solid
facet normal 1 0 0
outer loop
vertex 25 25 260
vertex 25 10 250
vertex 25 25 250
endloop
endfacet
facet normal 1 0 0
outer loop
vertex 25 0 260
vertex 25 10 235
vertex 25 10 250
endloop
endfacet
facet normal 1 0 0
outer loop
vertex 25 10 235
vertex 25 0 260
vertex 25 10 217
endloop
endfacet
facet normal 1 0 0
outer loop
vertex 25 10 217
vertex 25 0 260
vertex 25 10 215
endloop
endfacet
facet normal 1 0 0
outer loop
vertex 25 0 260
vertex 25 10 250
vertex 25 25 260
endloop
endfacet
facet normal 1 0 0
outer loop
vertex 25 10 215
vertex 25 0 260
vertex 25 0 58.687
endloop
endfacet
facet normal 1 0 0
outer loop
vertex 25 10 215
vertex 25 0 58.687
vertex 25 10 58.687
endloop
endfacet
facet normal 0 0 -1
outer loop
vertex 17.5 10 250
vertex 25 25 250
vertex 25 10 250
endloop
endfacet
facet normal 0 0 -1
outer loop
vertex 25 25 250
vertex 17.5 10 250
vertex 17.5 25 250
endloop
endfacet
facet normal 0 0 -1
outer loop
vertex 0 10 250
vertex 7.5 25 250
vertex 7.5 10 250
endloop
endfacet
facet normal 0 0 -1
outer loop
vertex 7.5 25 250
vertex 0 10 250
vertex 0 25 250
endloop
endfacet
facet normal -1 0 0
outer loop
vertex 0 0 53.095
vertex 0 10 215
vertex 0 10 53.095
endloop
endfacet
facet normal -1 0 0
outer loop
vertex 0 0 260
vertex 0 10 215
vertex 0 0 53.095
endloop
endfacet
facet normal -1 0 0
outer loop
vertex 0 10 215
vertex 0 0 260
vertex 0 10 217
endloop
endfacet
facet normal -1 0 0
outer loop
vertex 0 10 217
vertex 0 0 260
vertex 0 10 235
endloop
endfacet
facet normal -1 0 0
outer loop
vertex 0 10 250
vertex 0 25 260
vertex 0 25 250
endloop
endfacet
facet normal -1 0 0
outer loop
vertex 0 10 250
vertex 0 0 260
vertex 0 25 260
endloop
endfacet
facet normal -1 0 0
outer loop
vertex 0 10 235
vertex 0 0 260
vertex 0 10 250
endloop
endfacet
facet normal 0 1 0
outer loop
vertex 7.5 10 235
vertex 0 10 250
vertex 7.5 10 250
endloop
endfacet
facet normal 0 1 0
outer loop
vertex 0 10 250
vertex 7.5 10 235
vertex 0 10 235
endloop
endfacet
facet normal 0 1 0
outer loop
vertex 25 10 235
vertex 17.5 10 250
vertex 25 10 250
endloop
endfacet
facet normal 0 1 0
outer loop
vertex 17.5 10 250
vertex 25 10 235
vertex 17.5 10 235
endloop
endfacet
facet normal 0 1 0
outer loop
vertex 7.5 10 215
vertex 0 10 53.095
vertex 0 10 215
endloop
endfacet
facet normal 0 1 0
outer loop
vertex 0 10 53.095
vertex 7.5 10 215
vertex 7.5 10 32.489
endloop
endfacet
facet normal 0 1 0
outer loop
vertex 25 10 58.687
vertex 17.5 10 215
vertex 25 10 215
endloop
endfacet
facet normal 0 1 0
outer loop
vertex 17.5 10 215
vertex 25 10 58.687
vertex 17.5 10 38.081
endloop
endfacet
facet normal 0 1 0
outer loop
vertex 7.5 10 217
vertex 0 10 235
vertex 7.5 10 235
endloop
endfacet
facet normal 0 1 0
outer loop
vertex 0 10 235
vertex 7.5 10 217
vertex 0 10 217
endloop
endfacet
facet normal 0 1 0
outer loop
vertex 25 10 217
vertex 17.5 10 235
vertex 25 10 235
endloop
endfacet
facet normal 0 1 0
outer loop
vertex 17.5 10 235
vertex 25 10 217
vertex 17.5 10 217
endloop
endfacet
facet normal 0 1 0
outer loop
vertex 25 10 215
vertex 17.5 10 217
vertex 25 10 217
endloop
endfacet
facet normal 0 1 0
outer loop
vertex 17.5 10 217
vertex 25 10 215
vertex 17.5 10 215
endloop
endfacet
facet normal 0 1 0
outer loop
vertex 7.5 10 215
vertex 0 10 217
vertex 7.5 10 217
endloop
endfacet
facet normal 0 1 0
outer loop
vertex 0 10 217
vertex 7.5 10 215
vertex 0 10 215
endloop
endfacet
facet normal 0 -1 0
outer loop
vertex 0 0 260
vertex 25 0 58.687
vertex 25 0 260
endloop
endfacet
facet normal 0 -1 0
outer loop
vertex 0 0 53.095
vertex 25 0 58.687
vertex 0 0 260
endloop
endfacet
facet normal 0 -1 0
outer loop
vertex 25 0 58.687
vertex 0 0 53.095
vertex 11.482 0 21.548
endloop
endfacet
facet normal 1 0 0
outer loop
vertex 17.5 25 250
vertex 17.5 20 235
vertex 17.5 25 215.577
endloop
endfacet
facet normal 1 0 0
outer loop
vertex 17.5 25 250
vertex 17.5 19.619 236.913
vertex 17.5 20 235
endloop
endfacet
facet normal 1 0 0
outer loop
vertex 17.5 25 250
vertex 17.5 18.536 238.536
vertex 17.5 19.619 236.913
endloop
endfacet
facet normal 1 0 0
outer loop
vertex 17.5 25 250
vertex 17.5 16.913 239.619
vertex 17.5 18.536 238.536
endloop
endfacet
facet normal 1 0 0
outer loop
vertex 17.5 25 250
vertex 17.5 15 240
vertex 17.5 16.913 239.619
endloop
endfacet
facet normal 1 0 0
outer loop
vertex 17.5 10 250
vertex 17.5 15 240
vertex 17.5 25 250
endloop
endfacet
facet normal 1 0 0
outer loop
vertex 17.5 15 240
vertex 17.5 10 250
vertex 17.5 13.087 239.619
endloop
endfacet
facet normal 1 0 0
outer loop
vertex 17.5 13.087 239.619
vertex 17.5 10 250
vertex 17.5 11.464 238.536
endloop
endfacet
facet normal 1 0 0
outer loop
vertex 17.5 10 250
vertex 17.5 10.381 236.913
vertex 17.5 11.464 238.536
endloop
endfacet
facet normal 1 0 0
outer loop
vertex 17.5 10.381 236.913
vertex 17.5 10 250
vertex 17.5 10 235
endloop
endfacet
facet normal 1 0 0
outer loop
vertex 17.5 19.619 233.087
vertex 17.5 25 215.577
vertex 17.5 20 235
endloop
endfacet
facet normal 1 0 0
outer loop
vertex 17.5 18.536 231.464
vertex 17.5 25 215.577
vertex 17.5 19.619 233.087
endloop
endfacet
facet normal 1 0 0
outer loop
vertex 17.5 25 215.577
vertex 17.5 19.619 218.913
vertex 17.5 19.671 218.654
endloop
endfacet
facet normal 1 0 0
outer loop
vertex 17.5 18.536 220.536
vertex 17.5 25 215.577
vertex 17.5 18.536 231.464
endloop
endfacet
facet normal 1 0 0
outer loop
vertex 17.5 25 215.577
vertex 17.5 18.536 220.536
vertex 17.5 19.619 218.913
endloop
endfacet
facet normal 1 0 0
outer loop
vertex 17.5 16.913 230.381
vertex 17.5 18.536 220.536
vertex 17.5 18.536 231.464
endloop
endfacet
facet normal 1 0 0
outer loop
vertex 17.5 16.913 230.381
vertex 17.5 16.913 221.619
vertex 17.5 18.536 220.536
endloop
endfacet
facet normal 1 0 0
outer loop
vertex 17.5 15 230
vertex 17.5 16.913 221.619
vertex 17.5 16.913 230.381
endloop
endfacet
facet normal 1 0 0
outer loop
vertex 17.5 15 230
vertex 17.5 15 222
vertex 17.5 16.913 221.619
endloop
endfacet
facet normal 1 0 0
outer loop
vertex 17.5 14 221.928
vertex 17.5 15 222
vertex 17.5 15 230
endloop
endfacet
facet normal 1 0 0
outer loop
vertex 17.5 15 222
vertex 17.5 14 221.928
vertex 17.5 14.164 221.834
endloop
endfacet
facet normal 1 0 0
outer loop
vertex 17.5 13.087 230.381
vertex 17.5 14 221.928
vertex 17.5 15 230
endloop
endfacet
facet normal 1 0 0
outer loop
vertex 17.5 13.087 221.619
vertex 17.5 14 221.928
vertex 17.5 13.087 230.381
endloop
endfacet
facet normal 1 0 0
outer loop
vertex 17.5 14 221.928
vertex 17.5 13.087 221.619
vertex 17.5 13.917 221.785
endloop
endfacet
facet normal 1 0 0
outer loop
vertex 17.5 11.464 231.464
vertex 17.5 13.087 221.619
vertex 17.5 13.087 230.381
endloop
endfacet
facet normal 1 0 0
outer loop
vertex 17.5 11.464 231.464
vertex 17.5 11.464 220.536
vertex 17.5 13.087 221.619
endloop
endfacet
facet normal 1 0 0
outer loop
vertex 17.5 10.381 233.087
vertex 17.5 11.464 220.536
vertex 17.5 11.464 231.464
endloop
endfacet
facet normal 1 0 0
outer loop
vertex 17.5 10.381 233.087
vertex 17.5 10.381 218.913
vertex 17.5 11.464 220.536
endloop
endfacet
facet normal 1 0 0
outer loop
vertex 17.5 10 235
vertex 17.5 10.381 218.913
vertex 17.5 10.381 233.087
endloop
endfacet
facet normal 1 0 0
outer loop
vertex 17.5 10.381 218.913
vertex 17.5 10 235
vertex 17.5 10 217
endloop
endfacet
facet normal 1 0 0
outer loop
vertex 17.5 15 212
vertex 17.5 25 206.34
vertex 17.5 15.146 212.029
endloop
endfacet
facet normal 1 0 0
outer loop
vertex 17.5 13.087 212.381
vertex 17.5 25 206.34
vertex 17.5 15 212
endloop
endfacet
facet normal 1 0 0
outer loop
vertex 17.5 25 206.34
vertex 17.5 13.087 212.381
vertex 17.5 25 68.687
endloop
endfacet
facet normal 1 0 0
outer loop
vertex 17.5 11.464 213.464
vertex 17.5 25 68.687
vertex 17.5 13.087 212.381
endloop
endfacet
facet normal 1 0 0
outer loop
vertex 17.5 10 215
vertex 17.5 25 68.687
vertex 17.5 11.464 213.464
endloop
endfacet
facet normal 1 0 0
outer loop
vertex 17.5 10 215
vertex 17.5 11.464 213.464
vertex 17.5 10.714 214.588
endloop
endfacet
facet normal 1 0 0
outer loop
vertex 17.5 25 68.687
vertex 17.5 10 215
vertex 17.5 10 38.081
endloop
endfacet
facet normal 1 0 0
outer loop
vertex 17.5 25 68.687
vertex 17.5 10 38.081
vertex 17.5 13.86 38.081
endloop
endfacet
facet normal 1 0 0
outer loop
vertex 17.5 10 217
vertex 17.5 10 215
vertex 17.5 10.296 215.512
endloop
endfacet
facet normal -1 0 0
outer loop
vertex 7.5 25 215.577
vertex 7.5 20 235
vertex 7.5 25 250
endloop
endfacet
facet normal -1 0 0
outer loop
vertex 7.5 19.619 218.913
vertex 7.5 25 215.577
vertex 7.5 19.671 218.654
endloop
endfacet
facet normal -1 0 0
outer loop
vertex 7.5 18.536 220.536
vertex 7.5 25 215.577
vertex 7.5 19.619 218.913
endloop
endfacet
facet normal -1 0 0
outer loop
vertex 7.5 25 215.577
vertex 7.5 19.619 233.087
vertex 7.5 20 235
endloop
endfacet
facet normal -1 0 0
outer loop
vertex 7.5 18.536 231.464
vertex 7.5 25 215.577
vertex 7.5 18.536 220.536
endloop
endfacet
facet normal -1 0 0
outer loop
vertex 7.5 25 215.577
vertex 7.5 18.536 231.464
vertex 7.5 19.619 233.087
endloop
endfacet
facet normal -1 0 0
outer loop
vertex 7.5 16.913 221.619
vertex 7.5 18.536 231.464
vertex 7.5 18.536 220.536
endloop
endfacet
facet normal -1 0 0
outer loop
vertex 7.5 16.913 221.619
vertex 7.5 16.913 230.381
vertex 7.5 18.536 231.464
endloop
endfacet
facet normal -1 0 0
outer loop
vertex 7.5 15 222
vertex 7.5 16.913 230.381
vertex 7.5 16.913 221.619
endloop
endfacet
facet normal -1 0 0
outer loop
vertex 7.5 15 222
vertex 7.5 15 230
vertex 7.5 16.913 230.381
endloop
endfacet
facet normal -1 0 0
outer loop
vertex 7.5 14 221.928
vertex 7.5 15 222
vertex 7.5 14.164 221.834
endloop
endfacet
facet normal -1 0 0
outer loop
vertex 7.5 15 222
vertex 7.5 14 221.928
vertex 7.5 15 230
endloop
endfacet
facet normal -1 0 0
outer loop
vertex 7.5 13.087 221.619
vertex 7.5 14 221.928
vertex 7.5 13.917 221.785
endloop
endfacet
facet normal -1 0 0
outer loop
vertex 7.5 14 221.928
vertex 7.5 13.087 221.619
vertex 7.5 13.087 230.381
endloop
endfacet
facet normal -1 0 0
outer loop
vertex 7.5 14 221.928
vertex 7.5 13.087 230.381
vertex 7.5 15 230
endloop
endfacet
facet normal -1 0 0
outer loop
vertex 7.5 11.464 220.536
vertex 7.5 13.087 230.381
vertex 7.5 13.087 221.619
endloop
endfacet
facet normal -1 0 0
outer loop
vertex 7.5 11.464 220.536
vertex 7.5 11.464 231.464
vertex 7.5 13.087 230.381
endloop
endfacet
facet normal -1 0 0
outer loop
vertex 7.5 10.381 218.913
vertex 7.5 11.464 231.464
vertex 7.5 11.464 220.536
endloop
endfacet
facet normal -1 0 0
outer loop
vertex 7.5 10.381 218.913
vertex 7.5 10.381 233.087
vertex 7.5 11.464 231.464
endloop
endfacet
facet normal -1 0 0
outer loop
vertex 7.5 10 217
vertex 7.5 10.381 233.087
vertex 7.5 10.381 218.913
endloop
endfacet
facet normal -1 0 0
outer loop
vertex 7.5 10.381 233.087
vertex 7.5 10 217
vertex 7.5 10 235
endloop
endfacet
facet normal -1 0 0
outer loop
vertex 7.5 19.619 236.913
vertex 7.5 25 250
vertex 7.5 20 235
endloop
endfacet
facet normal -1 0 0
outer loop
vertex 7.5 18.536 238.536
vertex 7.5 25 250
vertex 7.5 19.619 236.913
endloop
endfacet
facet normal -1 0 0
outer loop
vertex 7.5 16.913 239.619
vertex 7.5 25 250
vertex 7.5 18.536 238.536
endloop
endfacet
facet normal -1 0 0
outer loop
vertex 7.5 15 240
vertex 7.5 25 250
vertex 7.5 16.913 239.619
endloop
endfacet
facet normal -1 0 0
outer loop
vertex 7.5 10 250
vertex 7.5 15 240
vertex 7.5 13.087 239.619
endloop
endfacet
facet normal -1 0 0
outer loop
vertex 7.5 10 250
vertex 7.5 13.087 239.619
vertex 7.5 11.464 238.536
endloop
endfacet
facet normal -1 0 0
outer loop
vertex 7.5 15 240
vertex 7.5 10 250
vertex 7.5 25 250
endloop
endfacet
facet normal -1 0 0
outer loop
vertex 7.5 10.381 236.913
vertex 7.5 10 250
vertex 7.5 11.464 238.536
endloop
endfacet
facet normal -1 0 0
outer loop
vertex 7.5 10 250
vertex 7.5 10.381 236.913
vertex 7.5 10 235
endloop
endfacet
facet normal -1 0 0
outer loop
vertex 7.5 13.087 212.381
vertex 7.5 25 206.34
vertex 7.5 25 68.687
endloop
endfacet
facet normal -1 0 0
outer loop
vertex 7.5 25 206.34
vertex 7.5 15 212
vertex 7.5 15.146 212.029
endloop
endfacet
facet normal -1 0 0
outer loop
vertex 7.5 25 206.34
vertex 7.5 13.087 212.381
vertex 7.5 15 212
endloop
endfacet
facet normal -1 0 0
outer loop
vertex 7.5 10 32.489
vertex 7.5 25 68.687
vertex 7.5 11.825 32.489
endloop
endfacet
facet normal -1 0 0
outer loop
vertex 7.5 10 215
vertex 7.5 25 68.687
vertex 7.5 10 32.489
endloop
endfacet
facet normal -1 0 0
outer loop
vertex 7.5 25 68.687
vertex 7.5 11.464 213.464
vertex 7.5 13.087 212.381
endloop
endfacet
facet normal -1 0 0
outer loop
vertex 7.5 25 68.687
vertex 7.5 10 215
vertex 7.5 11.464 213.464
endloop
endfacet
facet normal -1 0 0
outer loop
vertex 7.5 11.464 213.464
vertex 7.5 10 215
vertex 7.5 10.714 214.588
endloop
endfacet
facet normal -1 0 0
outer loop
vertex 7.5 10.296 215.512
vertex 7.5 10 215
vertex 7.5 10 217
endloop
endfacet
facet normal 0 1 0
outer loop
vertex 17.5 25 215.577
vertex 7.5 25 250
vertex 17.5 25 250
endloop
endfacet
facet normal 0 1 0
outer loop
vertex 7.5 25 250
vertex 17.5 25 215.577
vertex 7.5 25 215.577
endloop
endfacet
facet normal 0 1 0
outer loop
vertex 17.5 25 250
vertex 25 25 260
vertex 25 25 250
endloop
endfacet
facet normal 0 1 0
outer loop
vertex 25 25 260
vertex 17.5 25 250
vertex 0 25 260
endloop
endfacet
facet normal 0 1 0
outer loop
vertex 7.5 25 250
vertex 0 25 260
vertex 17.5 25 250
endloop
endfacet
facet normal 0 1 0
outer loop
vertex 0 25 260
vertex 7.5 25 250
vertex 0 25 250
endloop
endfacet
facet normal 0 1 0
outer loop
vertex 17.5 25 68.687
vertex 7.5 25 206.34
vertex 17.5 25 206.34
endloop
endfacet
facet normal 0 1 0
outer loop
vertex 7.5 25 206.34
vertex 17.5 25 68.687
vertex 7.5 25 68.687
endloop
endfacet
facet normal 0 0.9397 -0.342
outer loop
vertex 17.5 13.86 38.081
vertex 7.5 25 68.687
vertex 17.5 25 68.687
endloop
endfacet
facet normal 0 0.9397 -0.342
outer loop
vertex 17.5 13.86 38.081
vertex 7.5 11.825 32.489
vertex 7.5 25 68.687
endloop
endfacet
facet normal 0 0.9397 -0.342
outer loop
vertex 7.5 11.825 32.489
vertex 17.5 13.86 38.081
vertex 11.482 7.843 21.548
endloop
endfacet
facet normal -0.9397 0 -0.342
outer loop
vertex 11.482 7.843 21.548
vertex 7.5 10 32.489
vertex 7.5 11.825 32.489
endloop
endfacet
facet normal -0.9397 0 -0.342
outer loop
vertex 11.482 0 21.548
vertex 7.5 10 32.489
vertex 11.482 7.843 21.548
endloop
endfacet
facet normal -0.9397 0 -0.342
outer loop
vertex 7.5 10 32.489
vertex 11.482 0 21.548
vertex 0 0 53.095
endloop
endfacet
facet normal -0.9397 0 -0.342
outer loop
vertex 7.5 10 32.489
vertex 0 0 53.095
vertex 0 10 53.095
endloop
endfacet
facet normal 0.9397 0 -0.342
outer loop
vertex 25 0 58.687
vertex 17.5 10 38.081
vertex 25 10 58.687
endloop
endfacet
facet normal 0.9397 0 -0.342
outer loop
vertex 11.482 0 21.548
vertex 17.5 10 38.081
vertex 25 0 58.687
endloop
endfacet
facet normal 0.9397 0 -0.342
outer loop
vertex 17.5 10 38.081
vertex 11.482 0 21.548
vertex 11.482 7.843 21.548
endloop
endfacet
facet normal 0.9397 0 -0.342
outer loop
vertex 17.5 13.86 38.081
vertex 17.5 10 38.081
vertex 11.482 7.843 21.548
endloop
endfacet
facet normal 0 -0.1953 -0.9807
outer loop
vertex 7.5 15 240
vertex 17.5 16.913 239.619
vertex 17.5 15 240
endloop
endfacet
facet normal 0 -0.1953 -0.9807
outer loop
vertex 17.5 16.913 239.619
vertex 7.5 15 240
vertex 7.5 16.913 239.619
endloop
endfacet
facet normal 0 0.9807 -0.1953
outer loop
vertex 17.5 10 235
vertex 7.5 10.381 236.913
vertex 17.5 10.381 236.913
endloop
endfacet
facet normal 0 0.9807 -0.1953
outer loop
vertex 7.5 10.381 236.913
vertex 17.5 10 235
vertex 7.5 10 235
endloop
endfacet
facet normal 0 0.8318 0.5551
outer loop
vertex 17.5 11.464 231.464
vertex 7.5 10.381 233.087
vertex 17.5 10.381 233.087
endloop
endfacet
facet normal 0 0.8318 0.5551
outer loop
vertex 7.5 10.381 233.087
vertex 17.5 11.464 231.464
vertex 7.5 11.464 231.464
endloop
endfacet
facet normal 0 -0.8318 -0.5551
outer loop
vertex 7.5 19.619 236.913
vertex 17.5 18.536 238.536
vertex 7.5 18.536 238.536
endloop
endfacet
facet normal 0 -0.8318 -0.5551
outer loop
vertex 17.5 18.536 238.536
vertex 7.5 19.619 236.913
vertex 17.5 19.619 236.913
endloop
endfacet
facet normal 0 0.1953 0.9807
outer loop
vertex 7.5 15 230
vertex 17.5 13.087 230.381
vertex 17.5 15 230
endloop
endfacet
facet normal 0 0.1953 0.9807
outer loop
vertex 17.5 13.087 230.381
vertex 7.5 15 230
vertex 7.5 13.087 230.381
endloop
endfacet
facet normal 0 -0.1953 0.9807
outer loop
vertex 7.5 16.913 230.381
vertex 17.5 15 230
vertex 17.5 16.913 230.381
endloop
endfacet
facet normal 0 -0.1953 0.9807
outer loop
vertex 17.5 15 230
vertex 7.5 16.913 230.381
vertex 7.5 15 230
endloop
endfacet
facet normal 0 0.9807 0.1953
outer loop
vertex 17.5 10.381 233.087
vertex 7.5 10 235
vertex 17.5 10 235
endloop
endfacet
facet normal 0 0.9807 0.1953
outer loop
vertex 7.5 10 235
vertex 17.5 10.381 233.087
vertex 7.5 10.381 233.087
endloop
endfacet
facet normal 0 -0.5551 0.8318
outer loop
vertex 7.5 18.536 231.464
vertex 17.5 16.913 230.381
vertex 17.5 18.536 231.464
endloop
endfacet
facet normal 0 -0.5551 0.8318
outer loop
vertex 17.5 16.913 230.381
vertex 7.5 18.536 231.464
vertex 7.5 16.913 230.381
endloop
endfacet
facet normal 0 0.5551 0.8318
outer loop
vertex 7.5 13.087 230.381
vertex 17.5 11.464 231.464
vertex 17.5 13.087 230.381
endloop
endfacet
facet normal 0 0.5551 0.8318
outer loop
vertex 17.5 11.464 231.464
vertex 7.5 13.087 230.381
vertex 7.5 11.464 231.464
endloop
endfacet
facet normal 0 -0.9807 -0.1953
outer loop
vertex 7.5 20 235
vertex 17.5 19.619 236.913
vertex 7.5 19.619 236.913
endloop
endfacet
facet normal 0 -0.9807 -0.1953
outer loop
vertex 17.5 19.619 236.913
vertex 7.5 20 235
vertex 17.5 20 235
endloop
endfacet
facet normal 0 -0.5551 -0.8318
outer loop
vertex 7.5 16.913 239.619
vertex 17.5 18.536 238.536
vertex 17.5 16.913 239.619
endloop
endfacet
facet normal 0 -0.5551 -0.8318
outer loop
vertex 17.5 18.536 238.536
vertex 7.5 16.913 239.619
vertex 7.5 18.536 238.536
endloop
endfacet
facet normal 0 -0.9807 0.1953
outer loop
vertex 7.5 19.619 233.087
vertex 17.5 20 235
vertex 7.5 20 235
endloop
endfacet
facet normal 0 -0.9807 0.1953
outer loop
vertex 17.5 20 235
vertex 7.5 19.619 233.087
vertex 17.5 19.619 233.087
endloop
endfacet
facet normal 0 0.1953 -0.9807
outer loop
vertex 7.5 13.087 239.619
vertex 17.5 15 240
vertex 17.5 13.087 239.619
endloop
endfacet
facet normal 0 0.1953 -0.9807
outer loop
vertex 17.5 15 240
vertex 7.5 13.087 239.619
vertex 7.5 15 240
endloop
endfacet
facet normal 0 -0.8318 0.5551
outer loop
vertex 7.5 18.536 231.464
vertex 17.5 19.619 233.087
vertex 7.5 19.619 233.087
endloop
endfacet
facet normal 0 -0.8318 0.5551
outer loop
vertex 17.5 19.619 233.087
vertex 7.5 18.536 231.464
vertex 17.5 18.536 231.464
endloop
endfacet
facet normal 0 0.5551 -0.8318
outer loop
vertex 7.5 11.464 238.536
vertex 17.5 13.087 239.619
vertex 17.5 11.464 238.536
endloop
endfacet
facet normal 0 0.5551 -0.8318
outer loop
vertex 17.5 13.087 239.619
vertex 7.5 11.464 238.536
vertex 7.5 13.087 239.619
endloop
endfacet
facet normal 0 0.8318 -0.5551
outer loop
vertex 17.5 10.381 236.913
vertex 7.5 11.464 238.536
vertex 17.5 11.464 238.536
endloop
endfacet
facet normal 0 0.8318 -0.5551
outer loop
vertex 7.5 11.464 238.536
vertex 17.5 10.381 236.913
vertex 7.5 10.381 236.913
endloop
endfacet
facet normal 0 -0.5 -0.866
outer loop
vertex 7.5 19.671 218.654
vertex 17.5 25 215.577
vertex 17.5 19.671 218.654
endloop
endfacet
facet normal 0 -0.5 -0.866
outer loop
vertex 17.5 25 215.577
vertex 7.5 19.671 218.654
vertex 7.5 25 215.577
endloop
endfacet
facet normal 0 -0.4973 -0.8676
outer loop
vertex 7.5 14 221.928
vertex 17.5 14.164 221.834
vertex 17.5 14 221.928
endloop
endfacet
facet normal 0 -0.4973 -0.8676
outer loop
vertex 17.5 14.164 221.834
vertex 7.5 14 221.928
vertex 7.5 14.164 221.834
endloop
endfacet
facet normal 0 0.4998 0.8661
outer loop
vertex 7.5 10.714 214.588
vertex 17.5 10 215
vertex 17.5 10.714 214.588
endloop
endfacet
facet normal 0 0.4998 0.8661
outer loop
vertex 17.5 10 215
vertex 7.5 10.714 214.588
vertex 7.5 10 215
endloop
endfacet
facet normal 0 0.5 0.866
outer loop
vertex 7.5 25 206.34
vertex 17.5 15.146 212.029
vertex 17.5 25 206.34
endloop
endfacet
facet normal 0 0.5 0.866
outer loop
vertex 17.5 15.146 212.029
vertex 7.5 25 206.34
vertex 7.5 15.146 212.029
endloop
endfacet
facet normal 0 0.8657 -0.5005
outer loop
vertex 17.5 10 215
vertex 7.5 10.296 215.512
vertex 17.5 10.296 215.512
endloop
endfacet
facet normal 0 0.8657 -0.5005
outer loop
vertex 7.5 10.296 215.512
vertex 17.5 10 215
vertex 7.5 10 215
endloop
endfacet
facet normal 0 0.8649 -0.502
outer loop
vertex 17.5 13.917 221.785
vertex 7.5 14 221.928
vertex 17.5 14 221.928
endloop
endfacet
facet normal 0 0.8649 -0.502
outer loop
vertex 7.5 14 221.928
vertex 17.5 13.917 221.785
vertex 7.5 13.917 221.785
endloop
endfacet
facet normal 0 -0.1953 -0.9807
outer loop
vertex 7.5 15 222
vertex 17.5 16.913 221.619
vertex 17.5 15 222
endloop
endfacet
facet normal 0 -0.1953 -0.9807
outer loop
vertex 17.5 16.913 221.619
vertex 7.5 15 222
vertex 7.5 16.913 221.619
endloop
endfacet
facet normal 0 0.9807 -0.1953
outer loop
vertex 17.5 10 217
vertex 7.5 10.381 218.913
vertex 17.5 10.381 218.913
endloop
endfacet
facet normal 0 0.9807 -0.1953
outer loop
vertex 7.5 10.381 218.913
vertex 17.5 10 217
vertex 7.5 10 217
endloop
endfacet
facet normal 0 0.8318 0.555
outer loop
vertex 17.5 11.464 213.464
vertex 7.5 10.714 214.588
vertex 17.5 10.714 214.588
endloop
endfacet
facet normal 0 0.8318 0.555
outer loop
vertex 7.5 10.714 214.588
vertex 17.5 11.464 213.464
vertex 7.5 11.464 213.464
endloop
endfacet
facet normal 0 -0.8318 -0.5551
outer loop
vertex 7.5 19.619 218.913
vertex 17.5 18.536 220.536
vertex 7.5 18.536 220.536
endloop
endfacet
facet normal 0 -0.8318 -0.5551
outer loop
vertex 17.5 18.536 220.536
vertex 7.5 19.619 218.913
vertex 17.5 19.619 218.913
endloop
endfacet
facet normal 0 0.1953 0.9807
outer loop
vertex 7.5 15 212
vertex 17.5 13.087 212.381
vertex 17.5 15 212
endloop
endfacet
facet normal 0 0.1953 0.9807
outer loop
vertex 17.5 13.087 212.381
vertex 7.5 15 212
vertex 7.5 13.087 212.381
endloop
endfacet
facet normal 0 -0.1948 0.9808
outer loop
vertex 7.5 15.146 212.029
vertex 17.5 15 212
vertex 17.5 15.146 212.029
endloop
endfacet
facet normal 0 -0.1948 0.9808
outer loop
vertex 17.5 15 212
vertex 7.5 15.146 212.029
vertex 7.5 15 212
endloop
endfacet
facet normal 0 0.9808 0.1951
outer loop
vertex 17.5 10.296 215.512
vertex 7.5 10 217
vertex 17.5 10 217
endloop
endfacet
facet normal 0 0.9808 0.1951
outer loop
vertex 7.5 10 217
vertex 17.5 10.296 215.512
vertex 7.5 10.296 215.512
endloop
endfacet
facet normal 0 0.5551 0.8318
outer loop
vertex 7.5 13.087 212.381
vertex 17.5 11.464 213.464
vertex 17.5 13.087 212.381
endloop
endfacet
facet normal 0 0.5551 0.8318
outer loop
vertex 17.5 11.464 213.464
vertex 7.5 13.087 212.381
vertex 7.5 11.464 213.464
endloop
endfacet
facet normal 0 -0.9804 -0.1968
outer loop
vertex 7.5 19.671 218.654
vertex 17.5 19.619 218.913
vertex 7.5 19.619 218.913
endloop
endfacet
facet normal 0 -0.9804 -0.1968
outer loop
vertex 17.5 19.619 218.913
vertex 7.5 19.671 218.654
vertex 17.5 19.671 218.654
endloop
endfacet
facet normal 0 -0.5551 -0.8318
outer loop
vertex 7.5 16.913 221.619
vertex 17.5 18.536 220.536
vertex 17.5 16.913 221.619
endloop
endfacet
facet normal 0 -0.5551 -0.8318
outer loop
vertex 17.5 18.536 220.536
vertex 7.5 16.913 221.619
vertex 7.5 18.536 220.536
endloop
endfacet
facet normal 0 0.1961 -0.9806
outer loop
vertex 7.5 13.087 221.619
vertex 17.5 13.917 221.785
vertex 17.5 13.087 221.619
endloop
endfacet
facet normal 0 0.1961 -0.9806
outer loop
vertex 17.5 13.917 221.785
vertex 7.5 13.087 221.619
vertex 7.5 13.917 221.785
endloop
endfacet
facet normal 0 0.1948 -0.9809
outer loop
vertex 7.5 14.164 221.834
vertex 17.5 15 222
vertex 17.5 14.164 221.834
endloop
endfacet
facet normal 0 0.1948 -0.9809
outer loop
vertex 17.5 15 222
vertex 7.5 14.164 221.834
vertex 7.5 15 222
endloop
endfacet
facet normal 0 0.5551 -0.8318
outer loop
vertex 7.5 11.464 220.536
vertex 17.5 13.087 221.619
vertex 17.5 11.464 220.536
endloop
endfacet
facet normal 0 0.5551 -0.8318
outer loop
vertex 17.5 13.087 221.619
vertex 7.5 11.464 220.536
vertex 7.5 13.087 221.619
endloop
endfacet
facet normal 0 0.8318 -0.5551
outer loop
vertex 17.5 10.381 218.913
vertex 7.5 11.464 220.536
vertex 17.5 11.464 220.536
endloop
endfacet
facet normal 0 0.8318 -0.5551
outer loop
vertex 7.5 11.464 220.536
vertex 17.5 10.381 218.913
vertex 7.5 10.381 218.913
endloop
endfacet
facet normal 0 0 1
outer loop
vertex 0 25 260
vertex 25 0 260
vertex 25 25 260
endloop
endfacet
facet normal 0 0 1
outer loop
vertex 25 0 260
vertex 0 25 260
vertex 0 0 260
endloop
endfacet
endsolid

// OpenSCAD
//Customizable Tent Spike
// This is a simple open-source parametric tent spike


//CUSTOMIZER VARIABLES

//Defines the depth of spike in mm
d=250;// [60:300]

//CUSTOMIZER VARIABLES END

//Defines the width of spike base in mm
w=25; 

//Defines the height of spike base  in mm
h= 10; 

//Defines the width of spike spine in mm
p=10; 

//Defines the height of spike spine in mm
s=25; 

//Defines the hole radius in mm
r=5; 


module spike() 
{
difference(){
difference(){
difference(){
difference(){
difference(){
difference(){
union(){
cube([w,h,d]); // spike base
translate([w/2-p/2,0,0]) cube([p,s, d]); //spike spine
}
rotate([-20,0,0]) cube([w,50,150]); //blade front
}
translate ([0,0,-20])rotate([0,-20,0]) cube ([w,w,100]);//blade right
}
translate ([0,0,-10])rotate([0,20,0]) cube ([w,w,100]);//blade left
}
translate([0,s-h,d-15])rotate([0,90,0])cylinder (h=w,r=r); // hole
}
translate([0,p,d-35])rotate([-30,0,0]) cube([w,2*p,p-2]); //square cut
}
translate([0,s-h,d-33])rotate([0,90,0])cylinder (h=w,r=r); // bottom of square cut
}
translate([0,0,d]) cube([s,s,h]); // hammer pad
}

spike();
